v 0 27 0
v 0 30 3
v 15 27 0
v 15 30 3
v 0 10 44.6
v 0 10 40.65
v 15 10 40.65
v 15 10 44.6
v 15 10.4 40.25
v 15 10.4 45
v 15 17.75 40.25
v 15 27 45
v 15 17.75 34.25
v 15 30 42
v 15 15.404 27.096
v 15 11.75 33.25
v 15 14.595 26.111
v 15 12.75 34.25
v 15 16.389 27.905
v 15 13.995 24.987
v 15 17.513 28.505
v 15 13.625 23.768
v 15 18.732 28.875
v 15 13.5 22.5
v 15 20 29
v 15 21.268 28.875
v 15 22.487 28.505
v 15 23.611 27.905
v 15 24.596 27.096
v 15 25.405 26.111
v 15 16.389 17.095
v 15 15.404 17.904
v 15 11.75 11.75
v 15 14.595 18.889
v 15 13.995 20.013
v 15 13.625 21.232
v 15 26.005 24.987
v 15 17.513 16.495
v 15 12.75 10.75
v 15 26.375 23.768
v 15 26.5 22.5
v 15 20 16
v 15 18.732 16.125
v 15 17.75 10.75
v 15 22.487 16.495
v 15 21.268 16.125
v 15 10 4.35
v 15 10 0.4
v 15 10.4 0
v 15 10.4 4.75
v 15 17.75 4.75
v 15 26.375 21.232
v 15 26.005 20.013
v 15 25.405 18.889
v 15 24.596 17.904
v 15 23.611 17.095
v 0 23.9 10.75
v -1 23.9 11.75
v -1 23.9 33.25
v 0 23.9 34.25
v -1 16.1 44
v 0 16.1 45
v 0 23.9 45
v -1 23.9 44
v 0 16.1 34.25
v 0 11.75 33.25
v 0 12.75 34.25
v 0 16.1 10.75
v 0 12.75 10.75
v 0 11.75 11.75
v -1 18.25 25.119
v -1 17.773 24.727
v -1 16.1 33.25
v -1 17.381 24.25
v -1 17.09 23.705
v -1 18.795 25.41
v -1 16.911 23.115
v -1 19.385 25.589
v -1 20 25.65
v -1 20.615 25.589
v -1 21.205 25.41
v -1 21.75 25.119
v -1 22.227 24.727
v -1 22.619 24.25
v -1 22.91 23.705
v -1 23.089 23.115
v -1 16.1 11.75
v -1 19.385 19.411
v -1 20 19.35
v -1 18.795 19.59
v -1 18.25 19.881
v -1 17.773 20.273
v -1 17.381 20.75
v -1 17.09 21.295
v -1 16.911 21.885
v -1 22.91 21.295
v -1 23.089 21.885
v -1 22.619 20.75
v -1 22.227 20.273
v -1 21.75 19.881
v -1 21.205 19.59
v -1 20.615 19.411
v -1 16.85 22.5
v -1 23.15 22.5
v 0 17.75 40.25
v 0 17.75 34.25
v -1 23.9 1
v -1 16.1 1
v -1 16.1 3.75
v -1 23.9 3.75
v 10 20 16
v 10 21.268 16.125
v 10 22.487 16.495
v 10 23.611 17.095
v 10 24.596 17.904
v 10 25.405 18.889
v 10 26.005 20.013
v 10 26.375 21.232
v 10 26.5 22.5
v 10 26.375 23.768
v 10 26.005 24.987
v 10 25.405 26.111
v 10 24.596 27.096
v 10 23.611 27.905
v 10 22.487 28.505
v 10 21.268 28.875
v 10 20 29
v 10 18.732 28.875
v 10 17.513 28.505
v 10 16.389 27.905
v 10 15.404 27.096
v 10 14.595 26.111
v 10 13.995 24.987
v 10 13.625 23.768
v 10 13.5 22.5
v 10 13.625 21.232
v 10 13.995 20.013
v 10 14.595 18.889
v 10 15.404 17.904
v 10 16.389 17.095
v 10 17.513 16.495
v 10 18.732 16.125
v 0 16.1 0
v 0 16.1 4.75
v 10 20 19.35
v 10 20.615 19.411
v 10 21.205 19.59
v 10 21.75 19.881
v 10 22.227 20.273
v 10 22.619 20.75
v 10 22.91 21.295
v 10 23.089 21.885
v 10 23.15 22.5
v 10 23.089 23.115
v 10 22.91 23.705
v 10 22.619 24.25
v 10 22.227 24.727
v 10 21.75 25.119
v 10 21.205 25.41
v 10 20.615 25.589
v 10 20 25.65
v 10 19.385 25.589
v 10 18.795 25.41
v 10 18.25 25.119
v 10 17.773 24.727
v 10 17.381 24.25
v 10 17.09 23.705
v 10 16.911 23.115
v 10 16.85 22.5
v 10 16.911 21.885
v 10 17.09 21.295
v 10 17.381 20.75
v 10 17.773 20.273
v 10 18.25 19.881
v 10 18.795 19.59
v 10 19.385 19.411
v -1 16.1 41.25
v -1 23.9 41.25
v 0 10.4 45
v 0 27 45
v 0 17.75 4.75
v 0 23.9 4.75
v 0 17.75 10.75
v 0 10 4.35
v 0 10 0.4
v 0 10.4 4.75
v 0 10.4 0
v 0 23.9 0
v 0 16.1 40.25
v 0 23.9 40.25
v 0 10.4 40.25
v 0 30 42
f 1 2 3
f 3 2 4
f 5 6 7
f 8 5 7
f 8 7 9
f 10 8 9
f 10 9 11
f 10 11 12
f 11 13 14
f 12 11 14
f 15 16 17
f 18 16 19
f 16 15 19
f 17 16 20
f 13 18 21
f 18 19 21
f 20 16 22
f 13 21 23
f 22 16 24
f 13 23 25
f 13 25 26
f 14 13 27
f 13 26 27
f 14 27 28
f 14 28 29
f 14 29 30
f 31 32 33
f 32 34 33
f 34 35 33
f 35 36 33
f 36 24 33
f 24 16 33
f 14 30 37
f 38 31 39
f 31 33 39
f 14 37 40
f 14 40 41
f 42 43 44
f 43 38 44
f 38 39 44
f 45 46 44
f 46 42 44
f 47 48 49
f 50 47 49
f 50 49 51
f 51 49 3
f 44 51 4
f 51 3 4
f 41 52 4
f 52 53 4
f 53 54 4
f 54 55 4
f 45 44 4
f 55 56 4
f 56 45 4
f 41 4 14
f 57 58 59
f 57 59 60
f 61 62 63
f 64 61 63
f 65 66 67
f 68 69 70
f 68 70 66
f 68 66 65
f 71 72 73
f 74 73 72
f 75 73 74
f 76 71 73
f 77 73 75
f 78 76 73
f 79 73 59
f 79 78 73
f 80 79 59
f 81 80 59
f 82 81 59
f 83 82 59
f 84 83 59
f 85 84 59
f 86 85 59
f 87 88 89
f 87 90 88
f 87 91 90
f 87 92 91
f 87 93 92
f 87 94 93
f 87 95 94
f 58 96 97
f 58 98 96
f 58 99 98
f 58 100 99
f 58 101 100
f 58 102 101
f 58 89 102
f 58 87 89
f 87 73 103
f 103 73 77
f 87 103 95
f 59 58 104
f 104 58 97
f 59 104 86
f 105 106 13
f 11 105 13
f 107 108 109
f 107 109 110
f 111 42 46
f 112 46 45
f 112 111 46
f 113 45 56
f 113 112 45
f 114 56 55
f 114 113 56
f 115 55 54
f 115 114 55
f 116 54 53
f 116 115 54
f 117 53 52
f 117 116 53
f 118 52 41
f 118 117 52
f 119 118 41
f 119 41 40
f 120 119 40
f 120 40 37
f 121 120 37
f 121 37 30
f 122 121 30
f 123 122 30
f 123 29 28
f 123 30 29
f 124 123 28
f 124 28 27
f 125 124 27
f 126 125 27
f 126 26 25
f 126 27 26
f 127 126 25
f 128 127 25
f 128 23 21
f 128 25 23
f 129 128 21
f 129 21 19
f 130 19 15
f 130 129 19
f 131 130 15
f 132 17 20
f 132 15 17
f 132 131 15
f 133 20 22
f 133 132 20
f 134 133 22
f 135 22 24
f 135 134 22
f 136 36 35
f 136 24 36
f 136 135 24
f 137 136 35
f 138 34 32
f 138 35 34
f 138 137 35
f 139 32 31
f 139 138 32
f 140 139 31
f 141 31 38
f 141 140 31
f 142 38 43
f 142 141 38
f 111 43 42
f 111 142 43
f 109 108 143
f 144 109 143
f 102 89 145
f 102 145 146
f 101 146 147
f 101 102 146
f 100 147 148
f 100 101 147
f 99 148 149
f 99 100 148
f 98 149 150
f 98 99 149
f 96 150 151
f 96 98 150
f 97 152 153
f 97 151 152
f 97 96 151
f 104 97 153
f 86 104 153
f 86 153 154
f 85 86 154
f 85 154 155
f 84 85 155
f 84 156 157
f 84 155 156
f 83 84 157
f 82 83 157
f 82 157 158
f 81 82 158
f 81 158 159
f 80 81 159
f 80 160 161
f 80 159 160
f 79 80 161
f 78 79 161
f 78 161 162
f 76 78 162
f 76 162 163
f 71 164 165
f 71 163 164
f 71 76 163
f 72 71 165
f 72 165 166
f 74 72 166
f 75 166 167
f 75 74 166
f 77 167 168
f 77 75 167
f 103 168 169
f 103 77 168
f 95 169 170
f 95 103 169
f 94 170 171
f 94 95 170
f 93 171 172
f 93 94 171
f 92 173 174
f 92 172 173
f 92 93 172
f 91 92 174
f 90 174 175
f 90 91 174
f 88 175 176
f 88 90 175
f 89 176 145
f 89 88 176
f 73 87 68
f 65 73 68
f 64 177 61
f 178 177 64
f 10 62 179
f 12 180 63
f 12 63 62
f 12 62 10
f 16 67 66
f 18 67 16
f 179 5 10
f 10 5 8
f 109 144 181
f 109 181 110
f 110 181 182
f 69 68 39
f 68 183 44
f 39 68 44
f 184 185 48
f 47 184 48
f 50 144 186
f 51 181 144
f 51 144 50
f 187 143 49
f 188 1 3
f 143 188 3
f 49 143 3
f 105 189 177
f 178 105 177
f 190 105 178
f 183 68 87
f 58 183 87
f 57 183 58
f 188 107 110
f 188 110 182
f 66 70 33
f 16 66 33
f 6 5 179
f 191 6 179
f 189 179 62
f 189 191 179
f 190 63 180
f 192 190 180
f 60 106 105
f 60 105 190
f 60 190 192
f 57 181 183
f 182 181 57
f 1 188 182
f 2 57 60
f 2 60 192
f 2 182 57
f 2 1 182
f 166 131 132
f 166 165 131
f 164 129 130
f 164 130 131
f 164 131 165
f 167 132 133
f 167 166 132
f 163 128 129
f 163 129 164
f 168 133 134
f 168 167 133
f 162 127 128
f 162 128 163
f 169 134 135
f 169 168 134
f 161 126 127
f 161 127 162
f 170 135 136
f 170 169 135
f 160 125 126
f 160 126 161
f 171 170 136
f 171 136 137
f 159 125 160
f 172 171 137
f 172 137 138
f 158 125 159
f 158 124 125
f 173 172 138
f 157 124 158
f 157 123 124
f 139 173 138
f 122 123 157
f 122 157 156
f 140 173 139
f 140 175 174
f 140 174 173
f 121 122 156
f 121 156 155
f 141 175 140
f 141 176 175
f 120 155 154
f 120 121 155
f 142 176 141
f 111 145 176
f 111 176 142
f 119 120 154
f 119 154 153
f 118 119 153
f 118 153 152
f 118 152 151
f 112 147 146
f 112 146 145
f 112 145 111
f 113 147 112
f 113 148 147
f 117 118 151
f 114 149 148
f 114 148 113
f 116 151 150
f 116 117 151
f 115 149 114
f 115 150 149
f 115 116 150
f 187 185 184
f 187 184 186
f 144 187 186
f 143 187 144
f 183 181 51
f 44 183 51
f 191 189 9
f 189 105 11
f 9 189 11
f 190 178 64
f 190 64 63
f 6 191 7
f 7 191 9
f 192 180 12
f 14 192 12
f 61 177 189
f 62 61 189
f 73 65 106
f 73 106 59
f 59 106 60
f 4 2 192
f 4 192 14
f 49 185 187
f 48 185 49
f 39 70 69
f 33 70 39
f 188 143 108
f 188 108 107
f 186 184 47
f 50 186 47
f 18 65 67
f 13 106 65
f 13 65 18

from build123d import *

# Parameters (mm, degrees)
CYLINDER005_R      = 3.15
CYLINDER005_DEPTH  = 18
CYLINDER004_R      = 6.5
CYLINDER004_DEPTH  = 18
BOX011_W           = 15
BOX011_H           = 7.75
BOX011_DEPTH       = 35.5
BOX009_W           = 15
BOX009_H           = 20
BOX009_DEPTH       = 45
BOX010_W           = 15
BOX010_H           = 7.75
BOX010_DEPTH       = 23.5
CHAMFER003012_SIZE = 0.4
CHAMFER003013_SIZE = 1
CHAMFER003014_SIZE = 3
BOX012_W           = 10
BOX012_H           = 7.8
BOX012_DEPTH       = 4.75
BOX013_W           = 10
BOX013_H           = 7.8
BOX013_DEPTH       = 4.75
BOX014_W           = 10
BOX014_H           = 7.8
BOX014_DEPTH       = 23.5
CHAMFER003008_SIZE = 1


with BuildPart() as cylinder005:
    # Cylinder005 → Cylinder005 (new body)
    with BuildSketch(Plane(origin=(-3.5, 20, 22.5), x_dir=(0, 0, -1), z_dir=(1, 0, 0))):
        Circle(CYLINDER005_R)
    extrude(amount=CYLINDER005_DEPTH)


with BuildPart() as cylinder004:
    # Cylinder004 → Cylinder004 (new body)
    with BuildSketch(Plane(origin=(10, 20, 22.5), x_dir=(0, 0, -1), z_dir=(1, 0, 0))):
        Circle(CYLINDER004_R)
    extrude(amount=CYLINDER004_DEPTH)


with BuildPart() as cube011:
    # Box011 → Box011 (new body)
    with BuildSketch(Plane(origin=(0, 10, 4.75), x_dir=(1, 0, 0), z_dir=(0, 0, 1))):
        with Locations((7.5, 3.875)):
            Rectangle(BOX011_W, BOX011_H)
    extrude(amount=BOX011_DEPTH)


with BuildPart() as cut008004003004014002002005003002:
    # Box009 → Box009 (new body)
    with BuildSketch(Plane(origin=(0, 10, 0), x_dir=(1, 0, 0), z_dir=(0, 0, 1))):
        with Locations((7.5, 10)):
            Rectangle(BOX009_W, BOX009_H)
    extrude(amount=BOX009_DEPTH)

    # Cut008004003004014002002005003002: cut Cube011
    add(cube011.part, mode=Mode.SUBTRACT)


with BuildPart() as chamfer003014:
    # Box010 → Box010 (new body)
    with BuildSketch(Plane(origin=(0, 11.75, 10.75), x_dir=(1, 0, 0), z_dir=(0, 0, 1))):
        with Locations((7.5, 3.875)):
            Rectangle(BOX010_W, BOX010_H)
    extrude(amount=BOX010_DEPTH)

    # Fusion008: union Cut008004003004014002002005003002
    add(cut008004003004014002002005003002.part)

    # Chamfer003012
    chamfer003012_edges = [chamfer003014.edges().sort_by_distance(p)[0] for p in [
        (7.5, 10, 40.25),
        (7.5, 10, 4.75),
        (7.5, 10, 0),
        (7.5, 10, 45),
    ]]
    chamfer(chamfer003012_edges, length=CHAMFER003012_SIZE)

    # Chamfer003013
    chamfer003013_edges = [chamfer003014.edges().sort_by_distance(p)[0] for p in [
        (7.5, 11.75, 10.75),
        (7.5, 11.75, 34.25),
    ]]
    chamfer(chamfer003013_edges, length=CHAMFER003013_SIZE)

    # Chamfer003014
    chamfer003014_edges = [chamfer003014.edges().sort_by_distance(p)[0] for p in [
        (7.5, 30, 0),
        (7.5, 30, 45),
    ]]
    chamfer(chamfer003014_edges, length=CHAMFER003014_SIZE)


with BuildPart() as cube012:
    # Box012 → Box012 (new body)
    with BuildSketch(Plane(origin=(-1, 16.1, 0), x_dir=(1, 0, 0), z_dir=(0, 0, 1))):
        with Locations((5, 3.9)):
            Rectangle(BOX012_W, BOX012_H)
    extrude(amount=BOX012_DEPTH)


with BuildPart() as cube013:
    # Box013 → Box013 (new body)
    with BuildSketch(Plane(origin=(-1, 16.1, 40.25), x_dir=(1, 0, 0), z_dir=(0, 0, 1))):
        with Locations((5, 3.9)):
            Rectangle(BOX013_W, BOX013_H)
    extrude(amount=BOX013_DEPTH)


with BuildPart() as din_stopper:
    # Box014 → Box014 (new body)
    with BuildSketch(Plane(origin=(-1, 16.1, 10.75), x_dir=(1, 0, 0), z_dir=(0, 0, 1))):
        with Locations((5, 3.9)):
            Rectangle(BOX014_W, BOX014_H)
    extrude(amount=BOX014_DEPTH)

    # Fusion005: union Cube012, Cube013
    add(cube012.part)
    add(cube013.part)

    # Chamfer003008
    chamfer003008_edges = [din_stopper.edges().sort_by_distance(p)[0] for p in [
        (-1, 20, 34.25),
        (-1, 20, 10.75),
        (-1, 20, 4.75),
        (-1, 20, 0),
        (-1, 20, 45),
        (-1, 20, 40.25),
    ]]
    chamfer(chamfer003008_edges, length=CHAMFER003008_SIZE)

    # Fusion009: union Chamfer003014
    add(chamfer003014.part)

    # Cut008004003004014002002005003003: cut Cylinder004
    add(cylinder004.part, mode=Mode.SUBTRACT)

    # Cut008004003004014002002005003004: cut Cylinder005
    add(cylinder005.part, mode=Mode.SUBTRACT)


solid = din_stopper.part
